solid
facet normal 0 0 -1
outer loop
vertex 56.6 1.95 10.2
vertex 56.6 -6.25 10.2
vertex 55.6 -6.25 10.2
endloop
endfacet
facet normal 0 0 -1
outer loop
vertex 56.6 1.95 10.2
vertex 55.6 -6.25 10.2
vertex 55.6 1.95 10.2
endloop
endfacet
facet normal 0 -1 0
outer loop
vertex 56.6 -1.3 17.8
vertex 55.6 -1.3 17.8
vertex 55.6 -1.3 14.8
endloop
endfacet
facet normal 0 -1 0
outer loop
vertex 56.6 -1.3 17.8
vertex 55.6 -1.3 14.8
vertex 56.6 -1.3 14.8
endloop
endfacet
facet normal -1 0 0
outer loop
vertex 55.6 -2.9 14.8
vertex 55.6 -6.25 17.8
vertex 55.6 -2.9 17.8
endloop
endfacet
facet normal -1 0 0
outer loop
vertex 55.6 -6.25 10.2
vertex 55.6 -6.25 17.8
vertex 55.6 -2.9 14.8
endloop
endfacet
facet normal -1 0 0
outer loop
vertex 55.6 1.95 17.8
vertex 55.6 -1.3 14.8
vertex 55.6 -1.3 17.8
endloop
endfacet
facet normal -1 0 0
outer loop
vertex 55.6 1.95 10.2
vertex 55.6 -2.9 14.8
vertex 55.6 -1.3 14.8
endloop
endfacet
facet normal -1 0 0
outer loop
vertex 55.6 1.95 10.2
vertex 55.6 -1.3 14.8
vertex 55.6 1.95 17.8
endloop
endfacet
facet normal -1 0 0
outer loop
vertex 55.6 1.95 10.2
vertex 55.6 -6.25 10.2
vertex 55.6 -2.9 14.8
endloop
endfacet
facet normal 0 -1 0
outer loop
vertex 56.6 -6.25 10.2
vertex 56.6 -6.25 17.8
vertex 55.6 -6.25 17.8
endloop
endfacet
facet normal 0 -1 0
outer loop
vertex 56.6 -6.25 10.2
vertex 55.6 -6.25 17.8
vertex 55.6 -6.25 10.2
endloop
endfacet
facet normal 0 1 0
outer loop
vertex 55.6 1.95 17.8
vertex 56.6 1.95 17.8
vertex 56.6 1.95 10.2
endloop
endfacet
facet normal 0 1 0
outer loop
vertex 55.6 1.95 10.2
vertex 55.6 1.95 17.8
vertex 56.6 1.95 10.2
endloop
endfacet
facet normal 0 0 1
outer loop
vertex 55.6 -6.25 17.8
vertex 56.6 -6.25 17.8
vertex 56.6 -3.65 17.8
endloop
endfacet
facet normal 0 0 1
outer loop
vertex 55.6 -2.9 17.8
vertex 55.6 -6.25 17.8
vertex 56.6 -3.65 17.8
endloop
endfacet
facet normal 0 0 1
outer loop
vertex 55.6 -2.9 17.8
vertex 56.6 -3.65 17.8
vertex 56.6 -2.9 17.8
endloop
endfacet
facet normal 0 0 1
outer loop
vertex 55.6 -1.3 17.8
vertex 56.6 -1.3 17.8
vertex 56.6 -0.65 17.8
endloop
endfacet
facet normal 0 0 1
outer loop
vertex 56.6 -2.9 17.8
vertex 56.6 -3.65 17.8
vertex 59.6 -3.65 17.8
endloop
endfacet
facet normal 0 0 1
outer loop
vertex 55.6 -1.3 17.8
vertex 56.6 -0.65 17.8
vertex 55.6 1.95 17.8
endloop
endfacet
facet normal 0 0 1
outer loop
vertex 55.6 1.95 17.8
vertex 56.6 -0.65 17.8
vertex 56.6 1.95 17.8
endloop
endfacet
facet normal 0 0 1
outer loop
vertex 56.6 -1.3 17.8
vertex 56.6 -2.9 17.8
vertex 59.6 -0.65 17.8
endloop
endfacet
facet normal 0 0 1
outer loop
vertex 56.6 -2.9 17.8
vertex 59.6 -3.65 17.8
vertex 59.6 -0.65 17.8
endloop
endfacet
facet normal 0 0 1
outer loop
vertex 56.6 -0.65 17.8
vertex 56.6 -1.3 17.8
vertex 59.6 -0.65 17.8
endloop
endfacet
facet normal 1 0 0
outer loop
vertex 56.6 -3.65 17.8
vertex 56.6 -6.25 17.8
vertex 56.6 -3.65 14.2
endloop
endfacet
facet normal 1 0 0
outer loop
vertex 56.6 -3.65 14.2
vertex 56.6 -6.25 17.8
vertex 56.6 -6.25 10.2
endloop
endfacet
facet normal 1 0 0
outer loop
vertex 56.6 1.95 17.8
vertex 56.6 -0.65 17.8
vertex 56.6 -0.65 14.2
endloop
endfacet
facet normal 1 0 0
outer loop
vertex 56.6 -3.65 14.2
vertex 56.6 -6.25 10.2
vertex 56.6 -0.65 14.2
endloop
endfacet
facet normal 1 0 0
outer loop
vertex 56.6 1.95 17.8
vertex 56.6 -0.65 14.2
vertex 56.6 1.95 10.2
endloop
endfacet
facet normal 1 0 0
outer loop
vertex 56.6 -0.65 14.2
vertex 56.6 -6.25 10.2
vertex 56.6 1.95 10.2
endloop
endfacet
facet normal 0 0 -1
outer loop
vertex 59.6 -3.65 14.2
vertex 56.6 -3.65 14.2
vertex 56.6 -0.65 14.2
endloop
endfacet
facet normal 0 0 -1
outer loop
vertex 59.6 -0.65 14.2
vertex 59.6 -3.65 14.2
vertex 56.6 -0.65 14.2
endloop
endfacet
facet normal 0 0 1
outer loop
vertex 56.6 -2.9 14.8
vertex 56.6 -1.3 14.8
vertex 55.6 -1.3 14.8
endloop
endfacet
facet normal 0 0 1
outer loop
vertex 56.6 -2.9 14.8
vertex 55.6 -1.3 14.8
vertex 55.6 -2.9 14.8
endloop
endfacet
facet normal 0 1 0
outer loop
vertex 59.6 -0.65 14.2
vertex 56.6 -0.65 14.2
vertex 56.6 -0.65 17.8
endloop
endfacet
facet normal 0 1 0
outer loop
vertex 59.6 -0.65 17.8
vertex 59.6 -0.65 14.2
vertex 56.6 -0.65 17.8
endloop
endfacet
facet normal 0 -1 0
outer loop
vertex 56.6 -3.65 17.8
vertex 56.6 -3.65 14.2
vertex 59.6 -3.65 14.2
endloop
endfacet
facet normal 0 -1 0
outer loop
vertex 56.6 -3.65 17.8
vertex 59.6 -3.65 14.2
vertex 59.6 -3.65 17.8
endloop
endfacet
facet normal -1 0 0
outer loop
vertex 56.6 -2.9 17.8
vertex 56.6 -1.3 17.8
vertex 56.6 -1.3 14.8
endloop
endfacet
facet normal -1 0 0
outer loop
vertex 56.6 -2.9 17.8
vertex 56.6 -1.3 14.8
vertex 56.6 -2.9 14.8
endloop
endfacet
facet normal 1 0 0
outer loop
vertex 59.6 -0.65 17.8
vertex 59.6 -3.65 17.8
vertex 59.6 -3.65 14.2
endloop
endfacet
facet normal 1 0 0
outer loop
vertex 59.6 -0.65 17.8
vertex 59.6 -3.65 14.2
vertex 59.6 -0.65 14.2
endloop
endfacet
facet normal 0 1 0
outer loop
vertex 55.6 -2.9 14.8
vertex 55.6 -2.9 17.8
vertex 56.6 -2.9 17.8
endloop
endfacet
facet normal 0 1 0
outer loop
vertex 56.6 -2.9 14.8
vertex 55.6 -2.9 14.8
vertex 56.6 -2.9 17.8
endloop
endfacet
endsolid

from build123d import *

# Parameters (mm, degrees)
SKETCH047_W     = 3
SKETCH047_H     = 3.6
PAD020_DEPTH    = 3
SKETCH048_W     = 8.2
SKETCH048_H     = 7.6
PAD021_DEPTH    = 1
SKETCH053_W     = 1.6
SKETCH053_H     = 1
POCKET018_DEPTH = 3


with BuildPart() as part:
    # Sketch047 → Pad020 (new body)
    with BuildSketch(Plane.YZ.offset(56.6)):
        with Locations((-2.15, 16)):
            Rectangle(SKETCH047_W, SKETCH047_H)
    extrude(amount=PAD020_DEPTH)

    # Sketch048 (on Face5 of Pad020) → Pad021 (join)
    with BuildSketch(Plane(origin=(56.6, 0, 0), x_dir=(0, 1, 0), z_dir=(-1, 0, 0))):
        with Locations((-2.15, -14)):
            Rectangle(SKETCH048_W, SKETCH048_H)
    extrude(amount=PAD021_DEPTH)

    # Sketch053 (on Face6 of Pad021) → Pocket018 (cut)
    with BuildSketch(Plane(origin=(0, 0, 17.8), x_dir=(0, -1, 0), z_dir=(0, 0, 1))):
        with Locations((2.1, 56.1)):
            Rectangle(SKETCH053_W, SKETCH053_H)
    extrude(amount=-POCKET018_DEPTH, mode=Mode.SUBTRACT)


solid = part.part
